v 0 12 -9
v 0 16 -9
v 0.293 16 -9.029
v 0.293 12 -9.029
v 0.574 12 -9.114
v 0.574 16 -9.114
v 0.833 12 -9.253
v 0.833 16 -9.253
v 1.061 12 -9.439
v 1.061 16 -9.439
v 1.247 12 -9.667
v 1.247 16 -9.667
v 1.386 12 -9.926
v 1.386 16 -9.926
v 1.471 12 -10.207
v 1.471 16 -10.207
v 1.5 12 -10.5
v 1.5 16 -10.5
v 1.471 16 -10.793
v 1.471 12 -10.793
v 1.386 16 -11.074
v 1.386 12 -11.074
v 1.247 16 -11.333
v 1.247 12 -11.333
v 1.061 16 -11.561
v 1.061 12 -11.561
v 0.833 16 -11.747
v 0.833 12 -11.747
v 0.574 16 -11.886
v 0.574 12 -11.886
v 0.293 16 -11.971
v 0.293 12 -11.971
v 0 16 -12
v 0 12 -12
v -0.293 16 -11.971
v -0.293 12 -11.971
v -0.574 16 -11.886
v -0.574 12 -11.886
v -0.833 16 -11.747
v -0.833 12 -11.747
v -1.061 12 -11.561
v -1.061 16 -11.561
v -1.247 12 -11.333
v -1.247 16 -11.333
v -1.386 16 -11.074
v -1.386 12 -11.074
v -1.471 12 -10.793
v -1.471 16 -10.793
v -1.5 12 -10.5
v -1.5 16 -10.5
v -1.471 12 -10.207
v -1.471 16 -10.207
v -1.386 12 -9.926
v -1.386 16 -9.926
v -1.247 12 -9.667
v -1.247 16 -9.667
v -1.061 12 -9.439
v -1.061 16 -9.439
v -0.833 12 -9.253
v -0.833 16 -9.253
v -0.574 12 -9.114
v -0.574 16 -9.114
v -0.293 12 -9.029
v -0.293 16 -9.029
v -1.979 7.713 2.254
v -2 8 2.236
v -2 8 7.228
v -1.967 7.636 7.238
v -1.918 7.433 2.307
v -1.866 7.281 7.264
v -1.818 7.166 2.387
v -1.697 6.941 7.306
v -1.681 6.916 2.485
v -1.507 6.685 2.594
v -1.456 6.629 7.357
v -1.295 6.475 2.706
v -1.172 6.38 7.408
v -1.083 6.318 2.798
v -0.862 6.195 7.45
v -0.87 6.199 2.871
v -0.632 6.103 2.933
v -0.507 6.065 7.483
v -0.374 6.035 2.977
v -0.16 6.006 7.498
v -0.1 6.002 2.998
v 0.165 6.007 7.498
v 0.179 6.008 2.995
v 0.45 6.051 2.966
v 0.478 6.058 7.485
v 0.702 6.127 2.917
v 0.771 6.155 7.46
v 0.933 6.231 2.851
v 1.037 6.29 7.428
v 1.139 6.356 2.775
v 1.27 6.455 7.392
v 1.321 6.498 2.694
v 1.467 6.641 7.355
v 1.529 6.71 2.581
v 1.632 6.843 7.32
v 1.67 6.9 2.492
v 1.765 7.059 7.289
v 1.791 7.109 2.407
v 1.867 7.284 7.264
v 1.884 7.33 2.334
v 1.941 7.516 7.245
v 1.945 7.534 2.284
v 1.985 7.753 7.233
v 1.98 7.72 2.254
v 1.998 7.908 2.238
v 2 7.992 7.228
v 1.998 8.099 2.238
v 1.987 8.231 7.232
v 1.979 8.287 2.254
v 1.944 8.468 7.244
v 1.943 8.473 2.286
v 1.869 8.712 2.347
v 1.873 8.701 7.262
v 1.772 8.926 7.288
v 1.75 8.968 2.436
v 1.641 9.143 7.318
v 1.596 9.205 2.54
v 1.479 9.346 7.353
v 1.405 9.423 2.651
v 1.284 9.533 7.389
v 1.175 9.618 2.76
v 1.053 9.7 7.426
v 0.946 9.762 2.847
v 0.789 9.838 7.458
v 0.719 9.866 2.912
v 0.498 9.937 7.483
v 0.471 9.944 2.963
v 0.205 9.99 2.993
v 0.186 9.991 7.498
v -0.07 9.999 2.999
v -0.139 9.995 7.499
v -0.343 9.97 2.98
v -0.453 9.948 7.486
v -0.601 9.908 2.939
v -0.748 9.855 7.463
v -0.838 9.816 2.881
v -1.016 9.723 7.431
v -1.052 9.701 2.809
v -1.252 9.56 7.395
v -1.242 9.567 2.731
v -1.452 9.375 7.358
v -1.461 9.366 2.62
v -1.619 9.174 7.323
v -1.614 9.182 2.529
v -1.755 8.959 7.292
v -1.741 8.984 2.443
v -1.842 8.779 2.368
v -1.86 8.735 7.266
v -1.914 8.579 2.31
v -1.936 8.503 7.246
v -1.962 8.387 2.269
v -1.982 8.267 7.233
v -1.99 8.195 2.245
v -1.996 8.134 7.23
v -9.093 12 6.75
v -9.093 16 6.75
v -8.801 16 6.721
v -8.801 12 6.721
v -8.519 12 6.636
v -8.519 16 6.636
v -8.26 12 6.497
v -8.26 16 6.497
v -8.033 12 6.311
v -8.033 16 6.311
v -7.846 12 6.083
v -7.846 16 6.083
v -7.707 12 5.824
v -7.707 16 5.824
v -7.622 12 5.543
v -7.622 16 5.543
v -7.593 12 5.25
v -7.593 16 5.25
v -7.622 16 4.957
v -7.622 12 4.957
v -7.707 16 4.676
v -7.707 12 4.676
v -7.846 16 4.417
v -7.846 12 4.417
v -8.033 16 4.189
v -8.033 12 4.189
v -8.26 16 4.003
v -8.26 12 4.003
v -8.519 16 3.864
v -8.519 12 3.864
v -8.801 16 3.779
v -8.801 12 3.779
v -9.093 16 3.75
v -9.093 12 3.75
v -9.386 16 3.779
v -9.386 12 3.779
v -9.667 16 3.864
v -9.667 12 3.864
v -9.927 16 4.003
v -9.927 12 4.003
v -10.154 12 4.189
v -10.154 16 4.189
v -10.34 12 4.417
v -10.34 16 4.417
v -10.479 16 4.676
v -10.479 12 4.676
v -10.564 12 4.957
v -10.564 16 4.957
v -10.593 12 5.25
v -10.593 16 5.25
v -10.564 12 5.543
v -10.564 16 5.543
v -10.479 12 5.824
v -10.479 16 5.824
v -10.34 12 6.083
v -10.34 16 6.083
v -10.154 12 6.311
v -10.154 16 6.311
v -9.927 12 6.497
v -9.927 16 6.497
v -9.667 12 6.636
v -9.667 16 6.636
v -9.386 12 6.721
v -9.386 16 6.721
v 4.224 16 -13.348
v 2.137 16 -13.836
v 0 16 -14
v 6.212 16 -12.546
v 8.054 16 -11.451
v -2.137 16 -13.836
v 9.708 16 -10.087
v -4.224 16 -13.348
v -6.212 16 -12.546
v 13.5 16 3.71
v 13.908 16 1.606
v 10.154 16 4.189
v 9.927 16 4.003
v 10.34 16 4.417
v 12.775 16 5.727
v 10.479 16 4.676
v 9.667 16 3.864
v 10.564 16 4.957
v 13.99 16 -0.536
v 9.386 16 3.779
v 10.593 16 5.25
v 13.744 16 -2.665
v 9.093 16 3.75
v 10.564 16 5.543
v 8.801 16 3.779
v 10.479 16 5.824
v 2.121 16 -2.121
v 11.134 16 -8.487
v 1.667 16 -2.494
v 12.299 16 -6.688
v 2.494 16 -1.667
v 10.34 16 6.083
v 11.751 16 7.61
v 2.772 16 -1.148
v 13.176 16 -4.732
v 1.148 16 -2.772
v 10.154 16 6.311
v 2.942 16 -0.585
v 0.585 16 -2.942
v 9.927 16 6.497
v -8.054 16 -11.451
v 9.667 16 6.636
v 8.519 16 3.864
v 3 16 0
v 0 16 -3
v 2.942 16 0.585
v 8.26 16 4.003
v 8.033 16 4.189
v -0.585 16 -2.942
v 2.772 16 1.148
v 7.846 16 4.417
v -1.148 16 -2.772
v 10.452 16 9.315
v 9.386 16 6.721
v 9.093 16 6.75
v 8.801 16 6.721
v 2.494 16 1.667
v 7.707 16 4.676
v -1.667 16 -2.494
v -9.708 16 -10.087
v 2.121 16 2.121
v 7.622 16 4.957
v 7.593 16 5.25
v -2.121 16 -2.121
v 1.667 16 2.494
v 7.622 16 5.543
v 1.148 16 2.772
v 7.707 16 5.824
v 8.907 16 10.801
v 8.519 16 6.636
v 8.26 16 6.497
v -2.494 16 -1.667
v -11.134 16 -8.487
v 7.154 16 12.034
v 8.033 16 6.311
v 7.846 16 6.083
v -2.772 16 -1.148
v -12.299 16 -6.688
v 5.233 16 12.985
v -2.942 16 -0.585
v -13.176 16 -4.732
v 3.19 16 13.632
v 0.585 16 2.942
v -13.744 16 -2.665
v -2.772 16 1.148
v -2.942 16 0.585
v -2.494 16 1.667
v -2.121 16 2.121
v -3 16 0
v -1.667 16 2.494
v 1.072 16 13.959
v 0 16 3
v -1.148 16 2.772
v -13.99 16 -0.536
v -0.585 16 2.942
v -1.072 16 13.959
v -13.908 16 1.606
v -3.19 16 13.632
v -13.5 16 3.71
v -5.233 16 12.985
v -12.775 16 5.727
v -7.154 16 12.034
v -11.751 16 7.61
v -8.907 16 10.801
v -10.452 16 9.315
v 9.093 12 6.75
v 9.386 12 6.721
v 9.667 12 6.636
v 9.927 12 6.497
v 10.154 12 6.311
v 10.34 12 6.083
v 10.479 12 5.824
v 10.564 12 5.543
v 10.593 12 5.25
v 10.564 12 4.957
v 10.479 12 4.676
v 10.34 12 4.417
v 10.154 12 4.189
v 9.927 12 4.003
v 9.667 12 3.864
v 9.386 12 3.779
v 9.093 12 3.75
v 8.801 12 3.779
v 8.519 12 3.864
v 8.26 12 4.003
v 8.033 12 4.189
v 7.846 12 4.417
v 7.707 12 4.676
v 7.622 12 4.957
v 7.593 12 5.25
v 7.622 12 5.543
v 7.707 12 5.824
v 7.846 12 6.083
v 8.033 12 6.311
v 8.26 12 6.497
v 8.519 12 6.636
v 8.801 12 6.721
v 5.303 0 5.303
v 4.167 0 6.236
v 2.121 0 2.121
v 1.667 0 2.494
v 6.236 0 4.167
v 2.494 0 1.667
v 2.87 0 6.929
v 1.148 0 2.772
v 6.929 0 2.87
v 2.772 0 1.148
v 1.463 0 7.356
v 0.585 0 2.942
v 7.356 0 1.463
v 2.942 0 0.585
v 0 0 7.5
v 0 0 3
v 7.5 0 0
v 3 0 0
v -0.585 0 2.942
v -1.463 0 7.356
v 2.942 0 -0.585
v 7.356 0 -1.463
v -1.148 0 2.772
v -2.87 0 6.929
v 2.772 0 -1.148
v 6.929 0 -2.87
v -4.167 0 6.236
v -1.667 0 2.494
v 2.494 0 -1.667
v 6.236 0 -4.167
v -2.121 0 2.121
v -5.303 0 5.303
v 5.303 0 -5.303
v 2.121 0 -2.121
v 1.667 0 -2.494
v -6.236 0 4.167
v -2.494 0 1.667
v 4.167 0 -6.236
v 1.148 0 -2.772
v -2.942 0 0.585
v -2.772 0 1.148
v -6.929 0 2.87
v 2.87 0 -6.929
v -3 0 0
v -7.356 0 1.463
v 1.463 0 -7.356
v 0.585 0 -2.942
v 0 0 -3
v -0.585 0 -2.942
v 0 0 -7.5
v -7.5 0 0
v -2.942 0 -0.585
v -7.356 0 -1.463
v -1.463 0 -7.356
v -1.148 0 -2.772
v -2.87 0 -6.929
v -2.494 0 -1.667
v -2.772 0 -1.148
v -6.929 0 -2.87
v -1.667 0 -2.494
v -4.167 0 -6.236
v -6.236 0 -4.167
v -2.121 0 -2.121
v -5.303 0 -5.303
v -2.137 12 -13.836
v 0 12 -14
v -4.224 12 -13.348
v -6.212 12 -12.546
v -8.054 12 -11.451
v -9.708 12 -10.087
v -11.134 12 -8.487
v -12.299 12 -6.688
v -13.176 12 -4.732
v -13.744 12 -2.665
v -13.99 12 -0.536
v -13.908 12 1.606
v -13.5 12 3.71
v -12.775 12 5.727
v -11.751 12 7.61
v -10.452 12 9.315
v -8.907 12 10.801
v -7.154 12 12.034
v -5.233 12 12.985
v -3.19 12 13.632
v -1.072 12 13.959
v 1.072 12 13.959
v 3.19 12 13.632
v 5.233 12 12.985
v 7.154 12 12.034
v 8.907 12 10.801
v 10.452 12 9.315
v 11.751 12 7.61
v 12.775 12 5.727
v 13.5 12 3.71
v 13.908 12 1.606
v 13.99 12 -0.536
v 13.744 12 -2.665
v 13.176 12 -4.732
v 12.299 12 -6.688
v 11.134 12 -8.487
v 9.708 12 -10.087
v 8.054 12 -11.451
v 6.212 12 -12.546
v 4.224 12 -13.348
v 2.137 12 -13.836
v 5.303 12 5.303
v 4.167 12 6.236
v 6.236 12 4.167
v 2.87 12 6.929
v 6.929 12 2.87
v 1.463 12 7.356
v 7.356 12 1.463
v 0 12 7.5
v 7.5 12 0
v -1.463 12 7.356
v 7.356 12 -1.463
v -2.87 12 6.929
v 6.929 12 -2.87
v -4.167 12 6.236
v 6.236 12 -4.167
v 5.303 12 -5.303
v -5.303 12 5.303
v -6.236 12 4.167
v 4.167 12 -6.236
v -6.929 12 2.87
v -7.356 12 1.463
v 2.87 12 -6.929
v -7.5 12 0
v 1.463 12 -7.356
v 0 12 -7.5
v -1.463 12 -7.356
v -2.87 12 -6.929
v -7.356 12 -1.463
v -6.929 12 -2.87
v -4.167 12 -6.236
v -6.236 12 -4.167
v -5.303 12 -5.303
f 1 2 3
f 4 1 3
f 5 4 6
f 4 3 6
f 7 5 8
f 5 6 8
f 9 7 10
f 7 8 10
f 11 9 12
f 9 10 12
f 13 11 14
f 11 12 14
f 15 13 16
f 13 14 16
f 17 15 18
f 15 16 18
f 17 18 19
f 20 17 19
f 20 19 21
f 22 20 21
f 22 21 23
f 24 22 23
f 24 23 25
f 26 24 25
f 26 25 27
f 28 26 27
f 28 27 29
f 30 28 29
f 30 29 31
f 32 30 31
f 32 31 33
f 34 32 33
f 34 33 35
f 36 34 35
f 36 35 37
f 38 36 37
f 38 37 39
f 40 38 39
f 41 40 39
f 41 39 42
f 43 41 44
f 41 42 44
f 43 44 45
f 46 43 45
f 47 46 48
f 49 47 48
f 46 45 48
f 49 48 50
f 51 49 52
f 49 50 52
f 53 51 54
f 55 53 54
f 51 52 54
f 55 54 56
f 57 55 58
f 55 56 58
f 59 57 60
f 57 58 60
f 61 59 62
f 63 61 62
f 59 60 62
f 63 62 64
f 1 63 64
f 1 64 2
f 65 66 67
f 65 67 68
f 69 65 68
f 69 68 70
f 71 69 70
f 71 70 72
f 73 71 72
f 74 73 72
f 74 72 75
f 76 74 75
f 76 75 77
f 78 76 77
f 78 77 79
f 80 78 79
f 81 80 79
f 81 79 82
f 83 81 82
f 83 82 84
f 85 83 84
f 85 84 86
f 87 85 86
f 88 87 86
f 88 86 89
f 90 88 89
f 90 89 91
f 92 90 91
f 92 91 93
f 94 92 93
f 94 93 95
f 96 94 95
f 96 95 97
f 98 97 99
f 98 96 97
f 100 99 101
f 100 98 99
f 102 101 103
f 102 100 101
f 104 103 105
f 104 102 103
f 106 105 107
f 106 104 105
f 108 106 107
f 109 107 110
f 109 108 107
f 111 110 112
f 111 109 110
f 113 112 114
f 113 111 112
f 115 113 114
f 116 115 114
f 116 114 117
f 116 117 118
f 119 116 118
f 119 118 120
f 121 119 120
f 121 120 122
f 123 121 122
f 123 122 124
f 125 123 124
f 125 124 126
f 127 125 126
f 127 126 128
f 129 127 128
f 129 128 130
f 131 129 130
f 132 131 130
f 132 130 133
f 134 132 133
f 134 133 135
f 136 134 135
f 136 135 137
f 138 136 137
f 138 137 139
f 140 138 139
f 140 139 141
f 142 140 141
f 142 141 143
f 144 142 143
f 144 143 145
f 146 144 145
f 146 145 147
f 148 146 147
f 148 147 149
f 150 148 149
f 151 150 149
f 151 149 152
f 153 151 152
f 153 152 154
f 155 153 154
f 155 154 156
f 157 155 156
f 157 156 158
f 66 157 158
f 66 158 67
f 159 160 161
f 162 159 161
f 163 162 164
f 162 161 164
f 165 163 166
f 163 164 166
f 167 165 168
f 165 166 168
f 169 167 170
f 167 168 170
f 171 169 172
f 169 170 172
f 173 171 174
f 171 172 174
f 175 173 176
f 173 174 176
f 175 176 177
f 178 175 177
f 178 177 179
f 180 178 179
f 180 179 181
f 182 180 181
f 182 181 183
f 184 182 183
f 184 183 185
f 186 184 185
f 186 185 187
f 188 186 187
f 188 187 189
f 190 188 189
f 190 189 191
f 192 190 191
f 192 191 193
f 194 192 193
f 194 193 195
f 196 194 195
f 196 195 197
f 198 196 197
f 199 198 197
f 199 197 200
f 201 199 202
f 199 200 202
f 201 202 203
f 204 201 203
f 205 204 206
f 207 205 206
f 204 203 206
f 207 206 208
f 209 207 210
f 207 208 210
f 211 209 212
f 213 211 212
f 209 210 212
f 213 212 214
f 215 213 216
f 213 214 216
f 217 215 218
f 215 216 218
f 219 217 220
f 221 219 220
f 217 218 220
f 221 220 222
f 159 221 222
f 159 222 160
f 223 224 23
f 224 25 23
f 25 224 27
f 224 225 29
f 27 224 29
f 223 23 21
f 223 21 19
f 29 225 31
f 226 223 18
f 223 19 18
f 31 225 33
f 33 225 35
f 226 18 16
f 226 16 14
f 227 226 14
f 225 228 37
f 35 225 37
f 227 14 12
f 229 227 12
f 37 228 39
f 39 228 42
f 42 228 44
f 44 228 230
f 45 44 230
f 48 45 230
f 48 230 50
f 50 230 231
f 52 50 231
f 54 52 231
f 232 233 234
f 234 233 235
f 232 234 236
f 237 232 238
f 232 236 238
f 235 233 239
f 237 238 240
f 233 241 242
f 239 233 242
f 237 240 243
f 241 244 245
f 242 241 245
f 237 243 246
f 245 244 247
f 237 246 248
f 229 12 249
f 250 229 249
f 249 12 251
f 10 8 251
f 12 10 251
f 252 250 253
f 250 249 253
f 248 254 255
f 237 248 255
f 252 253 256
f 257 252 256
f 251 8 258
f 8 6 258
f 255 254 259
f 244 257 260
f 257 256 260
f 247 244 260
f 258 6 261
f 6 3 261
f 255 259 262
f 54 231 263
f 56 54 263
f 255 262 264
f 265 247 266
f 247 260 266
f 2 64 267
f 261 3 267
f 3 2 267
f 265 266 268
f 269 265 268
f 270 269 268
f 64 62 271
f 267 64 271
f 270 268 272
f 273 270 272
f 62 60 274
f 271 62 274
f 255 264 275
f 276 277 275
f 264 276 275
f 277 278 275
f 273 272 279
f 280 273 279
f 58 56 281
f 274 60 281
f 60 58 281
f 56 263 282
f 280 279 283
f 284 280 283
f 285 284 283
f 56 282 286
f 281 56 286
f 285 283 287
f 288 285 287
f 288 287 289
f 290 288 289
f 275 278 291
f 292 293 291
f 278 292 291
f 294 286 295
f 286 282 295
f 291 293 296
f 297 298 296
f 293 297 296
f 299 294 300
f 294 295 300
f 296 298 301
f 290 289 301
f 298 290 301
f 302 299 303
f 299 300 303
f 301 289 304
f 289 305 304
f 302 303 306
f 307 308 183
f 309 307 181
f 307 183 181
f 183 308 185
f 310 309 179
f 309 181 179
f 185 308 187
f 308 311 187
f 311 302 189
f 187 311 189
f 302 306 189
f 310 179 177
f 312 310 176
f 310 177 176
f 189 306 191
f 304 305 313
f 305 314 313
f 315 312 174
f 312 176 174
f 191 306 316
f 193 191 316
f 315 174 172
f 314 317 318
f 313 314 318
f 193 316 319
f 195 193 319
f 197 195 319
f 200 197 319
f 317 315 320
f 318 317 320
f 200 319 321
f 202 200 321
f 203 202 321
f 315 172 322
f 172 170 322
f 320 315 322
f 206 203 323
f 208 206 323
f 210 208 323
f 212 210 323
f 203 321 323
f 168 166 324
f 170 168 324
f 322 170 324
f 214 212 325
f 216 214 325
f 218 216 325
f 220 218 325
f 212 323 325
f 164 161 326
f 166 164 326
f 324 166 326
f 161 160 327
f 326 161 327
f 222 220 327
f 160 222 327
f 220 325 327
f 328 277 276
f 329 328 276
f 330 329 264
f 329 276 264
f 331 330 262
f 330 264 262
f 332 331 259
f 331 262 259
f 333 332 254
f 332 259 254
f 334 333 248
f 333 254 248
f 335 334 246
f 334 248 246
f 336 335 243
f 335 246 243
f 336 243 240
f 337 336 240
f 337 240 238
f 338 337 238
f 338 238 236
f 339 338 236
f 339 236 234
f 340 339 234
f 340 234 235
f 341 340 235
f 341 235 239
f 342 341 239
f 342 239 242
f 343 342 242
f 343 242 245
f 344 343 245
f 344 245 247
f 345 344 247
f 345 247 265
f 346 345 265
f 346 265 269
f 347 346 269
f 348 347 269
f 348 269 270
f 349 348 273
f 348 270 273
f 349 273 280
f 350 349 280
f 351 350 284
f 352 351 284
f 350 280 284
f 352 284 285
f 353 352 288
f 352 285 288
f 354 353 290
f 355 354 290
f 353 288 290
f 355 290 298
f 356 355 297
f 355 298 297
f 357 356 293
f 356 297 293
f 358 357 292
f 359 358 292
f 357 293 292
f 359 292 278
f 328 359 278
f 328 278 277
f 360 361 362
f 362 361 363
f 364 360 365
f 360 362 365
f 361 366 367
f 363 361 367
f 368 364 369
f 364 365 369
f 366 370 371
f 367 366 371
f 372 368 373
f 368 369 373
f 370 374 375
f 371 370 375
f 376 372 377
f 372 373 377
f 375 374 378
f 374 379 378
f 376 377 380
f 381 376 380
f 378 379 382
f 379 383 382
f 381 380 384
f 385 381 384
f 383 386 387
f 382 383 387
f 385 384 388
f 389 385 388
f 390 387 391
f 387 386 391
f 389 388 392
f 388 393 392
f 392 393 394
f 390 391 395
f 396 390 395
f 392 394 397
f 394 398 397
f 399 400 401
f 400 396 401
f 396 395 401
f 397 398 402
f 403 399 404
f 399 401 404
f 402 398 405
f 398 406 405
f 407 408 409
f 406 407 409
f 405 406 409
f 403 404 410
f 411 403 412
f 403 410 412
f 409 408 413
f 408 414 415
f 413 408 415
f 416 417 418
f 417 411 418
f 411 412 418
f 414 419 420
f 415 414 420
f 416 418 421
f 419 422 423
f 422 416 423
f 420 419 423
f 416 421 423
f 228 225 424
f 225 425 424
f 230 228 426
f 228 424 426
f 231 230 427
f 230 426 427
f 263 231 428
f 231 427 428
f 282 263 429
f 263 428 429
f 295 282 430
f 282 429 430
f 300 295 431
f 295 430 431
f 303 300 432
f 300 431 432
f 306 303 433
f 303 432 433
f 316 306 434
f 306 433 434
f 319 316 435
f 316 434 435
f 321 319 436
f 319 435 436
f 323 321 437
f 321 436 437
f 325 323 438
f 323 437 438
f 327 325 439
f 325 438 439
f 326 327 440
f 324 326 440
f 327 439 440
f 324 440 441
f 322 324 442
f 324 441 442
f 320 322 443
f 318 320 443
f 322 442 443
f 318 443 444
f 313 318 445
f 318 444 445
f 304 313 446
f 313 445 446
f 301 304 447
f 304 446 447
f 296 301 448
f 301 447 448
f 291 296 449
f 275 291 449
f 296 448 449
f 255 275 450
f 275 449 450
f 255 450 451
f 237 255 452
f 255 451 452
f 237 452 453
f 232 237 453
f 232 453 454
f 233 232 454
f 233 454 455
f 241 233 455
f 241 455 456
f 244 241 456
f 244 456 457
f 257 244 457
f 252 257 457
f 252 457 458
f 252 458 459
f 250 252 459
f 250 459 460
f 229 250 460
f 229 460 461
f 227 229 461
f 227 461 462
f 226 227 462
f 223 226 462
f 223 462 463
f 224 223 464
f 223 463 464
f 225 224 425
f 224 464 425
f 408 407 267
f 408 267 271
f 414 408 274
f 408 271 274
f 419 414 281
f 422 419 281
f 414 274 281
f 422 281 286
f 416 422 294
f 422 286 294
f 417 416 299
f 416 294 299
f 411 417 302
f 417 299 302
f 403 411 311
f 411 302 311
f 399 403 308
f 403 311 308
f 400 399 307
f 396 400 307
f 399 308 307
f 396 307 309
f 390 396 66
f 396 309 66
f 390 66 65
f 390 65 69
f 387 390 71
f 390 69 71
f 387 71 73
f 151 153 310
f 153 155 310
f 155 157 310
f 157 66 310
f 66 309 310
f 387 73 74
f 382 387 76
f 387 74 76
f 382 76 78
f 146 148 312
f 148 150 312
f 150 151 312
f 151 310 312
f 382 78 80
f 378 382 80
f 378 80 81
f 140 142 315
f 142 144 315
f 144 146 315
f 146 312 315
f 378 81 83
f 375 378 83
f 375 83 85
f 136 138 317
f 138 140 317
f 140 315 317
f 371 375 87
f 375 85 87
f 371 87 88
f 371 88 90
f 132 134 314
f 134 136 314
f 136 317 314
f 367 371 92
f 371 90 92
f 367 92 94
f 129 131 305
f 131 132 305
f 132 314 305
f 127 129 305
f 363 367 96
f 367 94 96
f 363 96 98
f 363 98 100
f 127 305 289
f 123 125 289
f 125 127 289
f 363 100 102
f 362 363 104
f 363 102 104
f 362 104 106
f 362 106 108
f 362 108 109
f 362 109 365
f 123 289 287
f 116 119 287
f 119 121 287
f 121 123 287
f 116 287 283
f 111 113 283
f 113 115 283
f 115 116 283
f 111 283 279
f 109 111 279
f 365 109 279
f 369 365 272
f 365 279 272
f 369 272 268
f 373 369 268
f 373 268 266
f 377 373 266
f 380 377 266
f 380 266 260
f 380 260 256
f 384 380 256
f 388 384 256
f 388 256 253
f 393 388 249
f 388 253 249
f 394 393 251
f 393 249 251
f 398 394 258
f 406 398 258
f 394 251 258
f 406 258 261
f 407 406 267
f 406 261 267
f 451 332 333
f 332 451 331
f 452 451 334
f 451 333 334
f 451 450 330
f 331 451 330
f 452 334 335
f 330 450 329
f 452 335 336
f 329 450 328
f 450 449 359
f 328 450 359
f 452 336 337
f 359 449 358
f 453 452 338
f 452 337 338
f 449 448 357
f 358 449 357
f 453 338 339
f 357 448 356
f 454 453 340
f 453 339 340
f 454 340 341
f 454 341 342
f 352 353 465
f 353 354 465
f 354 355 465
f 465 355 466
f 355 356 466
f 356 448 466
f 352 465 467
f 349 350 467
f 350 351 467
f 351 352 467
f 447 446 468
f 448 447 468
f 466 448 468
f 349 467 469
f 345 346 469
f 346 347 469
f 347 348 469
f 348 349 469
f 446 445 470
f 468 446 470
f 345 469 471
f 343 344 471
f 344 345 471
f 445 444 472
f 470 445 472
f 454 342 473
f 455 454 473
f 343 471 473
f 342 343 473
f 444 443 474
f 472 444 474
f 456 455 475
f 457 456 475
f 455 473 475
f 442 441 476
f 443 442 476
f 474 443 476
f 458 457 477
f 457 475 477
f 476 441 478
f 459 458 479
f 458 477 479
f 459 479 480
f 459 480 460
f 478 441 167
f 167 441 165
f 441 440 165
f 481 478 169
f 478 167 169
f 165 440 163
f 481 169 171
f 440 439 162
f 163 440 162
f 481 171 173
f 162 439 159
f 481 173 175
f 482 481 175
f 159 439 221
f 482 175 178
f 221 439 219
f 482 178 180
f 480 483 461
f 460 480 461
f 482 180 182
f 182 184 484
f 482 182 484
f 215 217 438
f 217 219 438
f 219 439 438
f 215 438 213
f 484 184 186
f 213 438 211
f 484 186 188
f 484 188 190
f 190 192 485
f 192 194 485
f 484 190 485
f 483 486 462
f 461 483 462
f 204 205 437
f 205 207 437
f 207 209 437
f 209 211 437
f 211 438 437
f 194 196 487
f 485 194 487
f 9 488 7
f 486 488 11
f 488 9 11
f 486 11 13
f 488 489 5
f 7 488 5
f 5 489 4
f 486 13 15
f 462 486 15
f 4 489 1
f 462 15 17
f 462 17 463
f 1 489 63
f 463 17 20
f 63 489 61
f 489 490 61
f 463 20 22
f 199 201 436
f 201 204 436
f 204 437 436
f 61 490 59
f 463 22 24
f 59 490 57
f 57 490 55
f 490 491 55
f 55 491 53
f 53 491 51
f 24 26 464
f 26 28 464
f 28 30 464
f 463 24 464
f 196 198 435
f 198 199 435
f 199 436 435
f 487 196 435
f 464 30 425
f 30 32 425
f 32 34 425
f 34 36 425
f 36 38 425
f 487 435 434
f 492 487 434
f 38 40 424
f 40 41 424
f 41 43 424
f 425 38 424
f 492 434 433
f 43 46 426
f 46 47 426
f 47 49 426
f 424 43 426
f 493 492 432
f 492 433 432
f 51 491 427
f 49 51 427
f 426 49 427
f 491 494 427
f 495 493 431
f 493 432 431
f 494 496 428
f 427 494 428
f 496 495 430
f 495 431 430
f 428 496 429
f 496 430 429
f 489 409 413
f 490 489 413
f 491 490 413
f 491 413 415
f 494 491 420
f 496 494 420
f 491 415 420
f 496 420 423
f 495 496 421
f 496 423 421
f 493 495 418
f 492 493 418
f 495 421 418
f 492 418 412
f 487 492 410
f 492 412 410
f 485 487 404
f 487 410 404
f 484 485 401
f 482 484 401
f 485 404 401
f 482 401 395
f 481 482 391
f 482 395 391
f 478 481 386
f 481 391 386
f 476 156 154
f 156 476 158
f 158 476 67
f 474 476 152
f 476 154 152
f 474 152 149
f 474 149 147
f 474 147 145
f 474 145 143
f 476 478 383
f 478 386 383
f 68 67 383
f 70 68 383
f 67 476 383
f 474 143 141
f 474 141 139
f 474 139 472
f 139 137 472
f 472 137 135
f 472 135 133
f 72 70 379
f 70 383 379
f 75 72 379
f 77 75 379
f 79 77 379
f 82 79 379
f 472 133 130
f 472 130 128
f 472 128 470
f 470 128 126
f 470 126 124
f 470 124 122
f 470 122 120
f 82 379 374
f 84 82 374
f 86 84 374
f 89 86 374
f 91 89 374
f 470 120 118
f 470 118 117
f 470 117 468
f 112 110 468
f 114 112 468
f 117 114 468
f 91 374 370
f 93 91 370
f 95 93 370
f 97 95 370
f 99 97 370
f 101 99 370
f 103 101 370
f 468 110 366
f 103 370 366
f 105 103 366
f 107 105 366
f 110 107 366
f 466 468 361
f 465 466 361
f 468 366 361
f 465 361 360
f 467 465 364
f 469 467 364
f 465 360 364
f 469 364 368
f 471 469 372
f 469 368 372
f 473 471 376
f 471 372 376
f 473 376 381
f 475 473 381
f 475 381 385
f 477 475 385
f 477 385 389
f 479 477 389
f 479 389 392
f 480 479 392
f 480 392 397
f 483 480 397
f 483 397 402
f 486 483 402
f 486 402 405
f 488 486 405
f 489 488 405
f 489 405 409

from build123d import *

# Parameters (mm, degrees)
ESQUISSE2_R             = 1.5
ENL_V_MAT_EXTRU_1_DEPTH = 26.455844123
ESQUISSE3_R             = 2
ENL_V_MAT_EXTRU_2_DEPTH = 26.455844123


with BuildPart() as part:
    # Esquisse1 → Révolution1 (revolve)
    with BuildSketch(Plane.XY, mode=Mode.PRIVATE) as r_volution1_sk:
        Polygon((-3, 0), (-3, 16), (-14, 16), (-14, 12), (-7.5, 12), (-7.5, 0), align=None)
    revolve(r_volution1_sk.sketch.rotate(Axis((0, 0, 0), (0, 1, 0)), 270), axis=Axis((0, 0, 0), (0, 1, 0)))

    # Esquisse2 → Enlèv. mat.-Extru.1 (cut, through all)
    with BuildSketch(Plane(origin=(0, 16, 0), x_dir=(1, 0, 0), z_dir=(0, 1, 0))):
        with Locations(Location((9.09326674, -5.25, 0), (0, 0, 270))):
            Circle(ESQUISSE2_R)
        with Locations(Location((-9.09326674, -5.25, 0), (0, 0, 270))):
            Circle(ESQUISSE2_R)
        with Locations(Location((0, 10.5, 0), (0, 0, 270))):
            Circle(ESQUISSE2_R)
    extrude(amount=-ENL_V_MAT_EXTRU_1_DEPTH, mode=Mode.SUBTRACT)

    # Esquisse3 → Enlèv. mat.-Extru.2 (cut, through all)
    with BuildSketch(Plane.XY):
        with Locations(Location((0, 8, 0), (0, 0, 180))):
            Circle(ESQUISSE3_R)
    extrude(amount=ENL_V_MAT_EXTRU_2_DEPTH, mode=Mode.SUBTRACT)


solid = part.part
